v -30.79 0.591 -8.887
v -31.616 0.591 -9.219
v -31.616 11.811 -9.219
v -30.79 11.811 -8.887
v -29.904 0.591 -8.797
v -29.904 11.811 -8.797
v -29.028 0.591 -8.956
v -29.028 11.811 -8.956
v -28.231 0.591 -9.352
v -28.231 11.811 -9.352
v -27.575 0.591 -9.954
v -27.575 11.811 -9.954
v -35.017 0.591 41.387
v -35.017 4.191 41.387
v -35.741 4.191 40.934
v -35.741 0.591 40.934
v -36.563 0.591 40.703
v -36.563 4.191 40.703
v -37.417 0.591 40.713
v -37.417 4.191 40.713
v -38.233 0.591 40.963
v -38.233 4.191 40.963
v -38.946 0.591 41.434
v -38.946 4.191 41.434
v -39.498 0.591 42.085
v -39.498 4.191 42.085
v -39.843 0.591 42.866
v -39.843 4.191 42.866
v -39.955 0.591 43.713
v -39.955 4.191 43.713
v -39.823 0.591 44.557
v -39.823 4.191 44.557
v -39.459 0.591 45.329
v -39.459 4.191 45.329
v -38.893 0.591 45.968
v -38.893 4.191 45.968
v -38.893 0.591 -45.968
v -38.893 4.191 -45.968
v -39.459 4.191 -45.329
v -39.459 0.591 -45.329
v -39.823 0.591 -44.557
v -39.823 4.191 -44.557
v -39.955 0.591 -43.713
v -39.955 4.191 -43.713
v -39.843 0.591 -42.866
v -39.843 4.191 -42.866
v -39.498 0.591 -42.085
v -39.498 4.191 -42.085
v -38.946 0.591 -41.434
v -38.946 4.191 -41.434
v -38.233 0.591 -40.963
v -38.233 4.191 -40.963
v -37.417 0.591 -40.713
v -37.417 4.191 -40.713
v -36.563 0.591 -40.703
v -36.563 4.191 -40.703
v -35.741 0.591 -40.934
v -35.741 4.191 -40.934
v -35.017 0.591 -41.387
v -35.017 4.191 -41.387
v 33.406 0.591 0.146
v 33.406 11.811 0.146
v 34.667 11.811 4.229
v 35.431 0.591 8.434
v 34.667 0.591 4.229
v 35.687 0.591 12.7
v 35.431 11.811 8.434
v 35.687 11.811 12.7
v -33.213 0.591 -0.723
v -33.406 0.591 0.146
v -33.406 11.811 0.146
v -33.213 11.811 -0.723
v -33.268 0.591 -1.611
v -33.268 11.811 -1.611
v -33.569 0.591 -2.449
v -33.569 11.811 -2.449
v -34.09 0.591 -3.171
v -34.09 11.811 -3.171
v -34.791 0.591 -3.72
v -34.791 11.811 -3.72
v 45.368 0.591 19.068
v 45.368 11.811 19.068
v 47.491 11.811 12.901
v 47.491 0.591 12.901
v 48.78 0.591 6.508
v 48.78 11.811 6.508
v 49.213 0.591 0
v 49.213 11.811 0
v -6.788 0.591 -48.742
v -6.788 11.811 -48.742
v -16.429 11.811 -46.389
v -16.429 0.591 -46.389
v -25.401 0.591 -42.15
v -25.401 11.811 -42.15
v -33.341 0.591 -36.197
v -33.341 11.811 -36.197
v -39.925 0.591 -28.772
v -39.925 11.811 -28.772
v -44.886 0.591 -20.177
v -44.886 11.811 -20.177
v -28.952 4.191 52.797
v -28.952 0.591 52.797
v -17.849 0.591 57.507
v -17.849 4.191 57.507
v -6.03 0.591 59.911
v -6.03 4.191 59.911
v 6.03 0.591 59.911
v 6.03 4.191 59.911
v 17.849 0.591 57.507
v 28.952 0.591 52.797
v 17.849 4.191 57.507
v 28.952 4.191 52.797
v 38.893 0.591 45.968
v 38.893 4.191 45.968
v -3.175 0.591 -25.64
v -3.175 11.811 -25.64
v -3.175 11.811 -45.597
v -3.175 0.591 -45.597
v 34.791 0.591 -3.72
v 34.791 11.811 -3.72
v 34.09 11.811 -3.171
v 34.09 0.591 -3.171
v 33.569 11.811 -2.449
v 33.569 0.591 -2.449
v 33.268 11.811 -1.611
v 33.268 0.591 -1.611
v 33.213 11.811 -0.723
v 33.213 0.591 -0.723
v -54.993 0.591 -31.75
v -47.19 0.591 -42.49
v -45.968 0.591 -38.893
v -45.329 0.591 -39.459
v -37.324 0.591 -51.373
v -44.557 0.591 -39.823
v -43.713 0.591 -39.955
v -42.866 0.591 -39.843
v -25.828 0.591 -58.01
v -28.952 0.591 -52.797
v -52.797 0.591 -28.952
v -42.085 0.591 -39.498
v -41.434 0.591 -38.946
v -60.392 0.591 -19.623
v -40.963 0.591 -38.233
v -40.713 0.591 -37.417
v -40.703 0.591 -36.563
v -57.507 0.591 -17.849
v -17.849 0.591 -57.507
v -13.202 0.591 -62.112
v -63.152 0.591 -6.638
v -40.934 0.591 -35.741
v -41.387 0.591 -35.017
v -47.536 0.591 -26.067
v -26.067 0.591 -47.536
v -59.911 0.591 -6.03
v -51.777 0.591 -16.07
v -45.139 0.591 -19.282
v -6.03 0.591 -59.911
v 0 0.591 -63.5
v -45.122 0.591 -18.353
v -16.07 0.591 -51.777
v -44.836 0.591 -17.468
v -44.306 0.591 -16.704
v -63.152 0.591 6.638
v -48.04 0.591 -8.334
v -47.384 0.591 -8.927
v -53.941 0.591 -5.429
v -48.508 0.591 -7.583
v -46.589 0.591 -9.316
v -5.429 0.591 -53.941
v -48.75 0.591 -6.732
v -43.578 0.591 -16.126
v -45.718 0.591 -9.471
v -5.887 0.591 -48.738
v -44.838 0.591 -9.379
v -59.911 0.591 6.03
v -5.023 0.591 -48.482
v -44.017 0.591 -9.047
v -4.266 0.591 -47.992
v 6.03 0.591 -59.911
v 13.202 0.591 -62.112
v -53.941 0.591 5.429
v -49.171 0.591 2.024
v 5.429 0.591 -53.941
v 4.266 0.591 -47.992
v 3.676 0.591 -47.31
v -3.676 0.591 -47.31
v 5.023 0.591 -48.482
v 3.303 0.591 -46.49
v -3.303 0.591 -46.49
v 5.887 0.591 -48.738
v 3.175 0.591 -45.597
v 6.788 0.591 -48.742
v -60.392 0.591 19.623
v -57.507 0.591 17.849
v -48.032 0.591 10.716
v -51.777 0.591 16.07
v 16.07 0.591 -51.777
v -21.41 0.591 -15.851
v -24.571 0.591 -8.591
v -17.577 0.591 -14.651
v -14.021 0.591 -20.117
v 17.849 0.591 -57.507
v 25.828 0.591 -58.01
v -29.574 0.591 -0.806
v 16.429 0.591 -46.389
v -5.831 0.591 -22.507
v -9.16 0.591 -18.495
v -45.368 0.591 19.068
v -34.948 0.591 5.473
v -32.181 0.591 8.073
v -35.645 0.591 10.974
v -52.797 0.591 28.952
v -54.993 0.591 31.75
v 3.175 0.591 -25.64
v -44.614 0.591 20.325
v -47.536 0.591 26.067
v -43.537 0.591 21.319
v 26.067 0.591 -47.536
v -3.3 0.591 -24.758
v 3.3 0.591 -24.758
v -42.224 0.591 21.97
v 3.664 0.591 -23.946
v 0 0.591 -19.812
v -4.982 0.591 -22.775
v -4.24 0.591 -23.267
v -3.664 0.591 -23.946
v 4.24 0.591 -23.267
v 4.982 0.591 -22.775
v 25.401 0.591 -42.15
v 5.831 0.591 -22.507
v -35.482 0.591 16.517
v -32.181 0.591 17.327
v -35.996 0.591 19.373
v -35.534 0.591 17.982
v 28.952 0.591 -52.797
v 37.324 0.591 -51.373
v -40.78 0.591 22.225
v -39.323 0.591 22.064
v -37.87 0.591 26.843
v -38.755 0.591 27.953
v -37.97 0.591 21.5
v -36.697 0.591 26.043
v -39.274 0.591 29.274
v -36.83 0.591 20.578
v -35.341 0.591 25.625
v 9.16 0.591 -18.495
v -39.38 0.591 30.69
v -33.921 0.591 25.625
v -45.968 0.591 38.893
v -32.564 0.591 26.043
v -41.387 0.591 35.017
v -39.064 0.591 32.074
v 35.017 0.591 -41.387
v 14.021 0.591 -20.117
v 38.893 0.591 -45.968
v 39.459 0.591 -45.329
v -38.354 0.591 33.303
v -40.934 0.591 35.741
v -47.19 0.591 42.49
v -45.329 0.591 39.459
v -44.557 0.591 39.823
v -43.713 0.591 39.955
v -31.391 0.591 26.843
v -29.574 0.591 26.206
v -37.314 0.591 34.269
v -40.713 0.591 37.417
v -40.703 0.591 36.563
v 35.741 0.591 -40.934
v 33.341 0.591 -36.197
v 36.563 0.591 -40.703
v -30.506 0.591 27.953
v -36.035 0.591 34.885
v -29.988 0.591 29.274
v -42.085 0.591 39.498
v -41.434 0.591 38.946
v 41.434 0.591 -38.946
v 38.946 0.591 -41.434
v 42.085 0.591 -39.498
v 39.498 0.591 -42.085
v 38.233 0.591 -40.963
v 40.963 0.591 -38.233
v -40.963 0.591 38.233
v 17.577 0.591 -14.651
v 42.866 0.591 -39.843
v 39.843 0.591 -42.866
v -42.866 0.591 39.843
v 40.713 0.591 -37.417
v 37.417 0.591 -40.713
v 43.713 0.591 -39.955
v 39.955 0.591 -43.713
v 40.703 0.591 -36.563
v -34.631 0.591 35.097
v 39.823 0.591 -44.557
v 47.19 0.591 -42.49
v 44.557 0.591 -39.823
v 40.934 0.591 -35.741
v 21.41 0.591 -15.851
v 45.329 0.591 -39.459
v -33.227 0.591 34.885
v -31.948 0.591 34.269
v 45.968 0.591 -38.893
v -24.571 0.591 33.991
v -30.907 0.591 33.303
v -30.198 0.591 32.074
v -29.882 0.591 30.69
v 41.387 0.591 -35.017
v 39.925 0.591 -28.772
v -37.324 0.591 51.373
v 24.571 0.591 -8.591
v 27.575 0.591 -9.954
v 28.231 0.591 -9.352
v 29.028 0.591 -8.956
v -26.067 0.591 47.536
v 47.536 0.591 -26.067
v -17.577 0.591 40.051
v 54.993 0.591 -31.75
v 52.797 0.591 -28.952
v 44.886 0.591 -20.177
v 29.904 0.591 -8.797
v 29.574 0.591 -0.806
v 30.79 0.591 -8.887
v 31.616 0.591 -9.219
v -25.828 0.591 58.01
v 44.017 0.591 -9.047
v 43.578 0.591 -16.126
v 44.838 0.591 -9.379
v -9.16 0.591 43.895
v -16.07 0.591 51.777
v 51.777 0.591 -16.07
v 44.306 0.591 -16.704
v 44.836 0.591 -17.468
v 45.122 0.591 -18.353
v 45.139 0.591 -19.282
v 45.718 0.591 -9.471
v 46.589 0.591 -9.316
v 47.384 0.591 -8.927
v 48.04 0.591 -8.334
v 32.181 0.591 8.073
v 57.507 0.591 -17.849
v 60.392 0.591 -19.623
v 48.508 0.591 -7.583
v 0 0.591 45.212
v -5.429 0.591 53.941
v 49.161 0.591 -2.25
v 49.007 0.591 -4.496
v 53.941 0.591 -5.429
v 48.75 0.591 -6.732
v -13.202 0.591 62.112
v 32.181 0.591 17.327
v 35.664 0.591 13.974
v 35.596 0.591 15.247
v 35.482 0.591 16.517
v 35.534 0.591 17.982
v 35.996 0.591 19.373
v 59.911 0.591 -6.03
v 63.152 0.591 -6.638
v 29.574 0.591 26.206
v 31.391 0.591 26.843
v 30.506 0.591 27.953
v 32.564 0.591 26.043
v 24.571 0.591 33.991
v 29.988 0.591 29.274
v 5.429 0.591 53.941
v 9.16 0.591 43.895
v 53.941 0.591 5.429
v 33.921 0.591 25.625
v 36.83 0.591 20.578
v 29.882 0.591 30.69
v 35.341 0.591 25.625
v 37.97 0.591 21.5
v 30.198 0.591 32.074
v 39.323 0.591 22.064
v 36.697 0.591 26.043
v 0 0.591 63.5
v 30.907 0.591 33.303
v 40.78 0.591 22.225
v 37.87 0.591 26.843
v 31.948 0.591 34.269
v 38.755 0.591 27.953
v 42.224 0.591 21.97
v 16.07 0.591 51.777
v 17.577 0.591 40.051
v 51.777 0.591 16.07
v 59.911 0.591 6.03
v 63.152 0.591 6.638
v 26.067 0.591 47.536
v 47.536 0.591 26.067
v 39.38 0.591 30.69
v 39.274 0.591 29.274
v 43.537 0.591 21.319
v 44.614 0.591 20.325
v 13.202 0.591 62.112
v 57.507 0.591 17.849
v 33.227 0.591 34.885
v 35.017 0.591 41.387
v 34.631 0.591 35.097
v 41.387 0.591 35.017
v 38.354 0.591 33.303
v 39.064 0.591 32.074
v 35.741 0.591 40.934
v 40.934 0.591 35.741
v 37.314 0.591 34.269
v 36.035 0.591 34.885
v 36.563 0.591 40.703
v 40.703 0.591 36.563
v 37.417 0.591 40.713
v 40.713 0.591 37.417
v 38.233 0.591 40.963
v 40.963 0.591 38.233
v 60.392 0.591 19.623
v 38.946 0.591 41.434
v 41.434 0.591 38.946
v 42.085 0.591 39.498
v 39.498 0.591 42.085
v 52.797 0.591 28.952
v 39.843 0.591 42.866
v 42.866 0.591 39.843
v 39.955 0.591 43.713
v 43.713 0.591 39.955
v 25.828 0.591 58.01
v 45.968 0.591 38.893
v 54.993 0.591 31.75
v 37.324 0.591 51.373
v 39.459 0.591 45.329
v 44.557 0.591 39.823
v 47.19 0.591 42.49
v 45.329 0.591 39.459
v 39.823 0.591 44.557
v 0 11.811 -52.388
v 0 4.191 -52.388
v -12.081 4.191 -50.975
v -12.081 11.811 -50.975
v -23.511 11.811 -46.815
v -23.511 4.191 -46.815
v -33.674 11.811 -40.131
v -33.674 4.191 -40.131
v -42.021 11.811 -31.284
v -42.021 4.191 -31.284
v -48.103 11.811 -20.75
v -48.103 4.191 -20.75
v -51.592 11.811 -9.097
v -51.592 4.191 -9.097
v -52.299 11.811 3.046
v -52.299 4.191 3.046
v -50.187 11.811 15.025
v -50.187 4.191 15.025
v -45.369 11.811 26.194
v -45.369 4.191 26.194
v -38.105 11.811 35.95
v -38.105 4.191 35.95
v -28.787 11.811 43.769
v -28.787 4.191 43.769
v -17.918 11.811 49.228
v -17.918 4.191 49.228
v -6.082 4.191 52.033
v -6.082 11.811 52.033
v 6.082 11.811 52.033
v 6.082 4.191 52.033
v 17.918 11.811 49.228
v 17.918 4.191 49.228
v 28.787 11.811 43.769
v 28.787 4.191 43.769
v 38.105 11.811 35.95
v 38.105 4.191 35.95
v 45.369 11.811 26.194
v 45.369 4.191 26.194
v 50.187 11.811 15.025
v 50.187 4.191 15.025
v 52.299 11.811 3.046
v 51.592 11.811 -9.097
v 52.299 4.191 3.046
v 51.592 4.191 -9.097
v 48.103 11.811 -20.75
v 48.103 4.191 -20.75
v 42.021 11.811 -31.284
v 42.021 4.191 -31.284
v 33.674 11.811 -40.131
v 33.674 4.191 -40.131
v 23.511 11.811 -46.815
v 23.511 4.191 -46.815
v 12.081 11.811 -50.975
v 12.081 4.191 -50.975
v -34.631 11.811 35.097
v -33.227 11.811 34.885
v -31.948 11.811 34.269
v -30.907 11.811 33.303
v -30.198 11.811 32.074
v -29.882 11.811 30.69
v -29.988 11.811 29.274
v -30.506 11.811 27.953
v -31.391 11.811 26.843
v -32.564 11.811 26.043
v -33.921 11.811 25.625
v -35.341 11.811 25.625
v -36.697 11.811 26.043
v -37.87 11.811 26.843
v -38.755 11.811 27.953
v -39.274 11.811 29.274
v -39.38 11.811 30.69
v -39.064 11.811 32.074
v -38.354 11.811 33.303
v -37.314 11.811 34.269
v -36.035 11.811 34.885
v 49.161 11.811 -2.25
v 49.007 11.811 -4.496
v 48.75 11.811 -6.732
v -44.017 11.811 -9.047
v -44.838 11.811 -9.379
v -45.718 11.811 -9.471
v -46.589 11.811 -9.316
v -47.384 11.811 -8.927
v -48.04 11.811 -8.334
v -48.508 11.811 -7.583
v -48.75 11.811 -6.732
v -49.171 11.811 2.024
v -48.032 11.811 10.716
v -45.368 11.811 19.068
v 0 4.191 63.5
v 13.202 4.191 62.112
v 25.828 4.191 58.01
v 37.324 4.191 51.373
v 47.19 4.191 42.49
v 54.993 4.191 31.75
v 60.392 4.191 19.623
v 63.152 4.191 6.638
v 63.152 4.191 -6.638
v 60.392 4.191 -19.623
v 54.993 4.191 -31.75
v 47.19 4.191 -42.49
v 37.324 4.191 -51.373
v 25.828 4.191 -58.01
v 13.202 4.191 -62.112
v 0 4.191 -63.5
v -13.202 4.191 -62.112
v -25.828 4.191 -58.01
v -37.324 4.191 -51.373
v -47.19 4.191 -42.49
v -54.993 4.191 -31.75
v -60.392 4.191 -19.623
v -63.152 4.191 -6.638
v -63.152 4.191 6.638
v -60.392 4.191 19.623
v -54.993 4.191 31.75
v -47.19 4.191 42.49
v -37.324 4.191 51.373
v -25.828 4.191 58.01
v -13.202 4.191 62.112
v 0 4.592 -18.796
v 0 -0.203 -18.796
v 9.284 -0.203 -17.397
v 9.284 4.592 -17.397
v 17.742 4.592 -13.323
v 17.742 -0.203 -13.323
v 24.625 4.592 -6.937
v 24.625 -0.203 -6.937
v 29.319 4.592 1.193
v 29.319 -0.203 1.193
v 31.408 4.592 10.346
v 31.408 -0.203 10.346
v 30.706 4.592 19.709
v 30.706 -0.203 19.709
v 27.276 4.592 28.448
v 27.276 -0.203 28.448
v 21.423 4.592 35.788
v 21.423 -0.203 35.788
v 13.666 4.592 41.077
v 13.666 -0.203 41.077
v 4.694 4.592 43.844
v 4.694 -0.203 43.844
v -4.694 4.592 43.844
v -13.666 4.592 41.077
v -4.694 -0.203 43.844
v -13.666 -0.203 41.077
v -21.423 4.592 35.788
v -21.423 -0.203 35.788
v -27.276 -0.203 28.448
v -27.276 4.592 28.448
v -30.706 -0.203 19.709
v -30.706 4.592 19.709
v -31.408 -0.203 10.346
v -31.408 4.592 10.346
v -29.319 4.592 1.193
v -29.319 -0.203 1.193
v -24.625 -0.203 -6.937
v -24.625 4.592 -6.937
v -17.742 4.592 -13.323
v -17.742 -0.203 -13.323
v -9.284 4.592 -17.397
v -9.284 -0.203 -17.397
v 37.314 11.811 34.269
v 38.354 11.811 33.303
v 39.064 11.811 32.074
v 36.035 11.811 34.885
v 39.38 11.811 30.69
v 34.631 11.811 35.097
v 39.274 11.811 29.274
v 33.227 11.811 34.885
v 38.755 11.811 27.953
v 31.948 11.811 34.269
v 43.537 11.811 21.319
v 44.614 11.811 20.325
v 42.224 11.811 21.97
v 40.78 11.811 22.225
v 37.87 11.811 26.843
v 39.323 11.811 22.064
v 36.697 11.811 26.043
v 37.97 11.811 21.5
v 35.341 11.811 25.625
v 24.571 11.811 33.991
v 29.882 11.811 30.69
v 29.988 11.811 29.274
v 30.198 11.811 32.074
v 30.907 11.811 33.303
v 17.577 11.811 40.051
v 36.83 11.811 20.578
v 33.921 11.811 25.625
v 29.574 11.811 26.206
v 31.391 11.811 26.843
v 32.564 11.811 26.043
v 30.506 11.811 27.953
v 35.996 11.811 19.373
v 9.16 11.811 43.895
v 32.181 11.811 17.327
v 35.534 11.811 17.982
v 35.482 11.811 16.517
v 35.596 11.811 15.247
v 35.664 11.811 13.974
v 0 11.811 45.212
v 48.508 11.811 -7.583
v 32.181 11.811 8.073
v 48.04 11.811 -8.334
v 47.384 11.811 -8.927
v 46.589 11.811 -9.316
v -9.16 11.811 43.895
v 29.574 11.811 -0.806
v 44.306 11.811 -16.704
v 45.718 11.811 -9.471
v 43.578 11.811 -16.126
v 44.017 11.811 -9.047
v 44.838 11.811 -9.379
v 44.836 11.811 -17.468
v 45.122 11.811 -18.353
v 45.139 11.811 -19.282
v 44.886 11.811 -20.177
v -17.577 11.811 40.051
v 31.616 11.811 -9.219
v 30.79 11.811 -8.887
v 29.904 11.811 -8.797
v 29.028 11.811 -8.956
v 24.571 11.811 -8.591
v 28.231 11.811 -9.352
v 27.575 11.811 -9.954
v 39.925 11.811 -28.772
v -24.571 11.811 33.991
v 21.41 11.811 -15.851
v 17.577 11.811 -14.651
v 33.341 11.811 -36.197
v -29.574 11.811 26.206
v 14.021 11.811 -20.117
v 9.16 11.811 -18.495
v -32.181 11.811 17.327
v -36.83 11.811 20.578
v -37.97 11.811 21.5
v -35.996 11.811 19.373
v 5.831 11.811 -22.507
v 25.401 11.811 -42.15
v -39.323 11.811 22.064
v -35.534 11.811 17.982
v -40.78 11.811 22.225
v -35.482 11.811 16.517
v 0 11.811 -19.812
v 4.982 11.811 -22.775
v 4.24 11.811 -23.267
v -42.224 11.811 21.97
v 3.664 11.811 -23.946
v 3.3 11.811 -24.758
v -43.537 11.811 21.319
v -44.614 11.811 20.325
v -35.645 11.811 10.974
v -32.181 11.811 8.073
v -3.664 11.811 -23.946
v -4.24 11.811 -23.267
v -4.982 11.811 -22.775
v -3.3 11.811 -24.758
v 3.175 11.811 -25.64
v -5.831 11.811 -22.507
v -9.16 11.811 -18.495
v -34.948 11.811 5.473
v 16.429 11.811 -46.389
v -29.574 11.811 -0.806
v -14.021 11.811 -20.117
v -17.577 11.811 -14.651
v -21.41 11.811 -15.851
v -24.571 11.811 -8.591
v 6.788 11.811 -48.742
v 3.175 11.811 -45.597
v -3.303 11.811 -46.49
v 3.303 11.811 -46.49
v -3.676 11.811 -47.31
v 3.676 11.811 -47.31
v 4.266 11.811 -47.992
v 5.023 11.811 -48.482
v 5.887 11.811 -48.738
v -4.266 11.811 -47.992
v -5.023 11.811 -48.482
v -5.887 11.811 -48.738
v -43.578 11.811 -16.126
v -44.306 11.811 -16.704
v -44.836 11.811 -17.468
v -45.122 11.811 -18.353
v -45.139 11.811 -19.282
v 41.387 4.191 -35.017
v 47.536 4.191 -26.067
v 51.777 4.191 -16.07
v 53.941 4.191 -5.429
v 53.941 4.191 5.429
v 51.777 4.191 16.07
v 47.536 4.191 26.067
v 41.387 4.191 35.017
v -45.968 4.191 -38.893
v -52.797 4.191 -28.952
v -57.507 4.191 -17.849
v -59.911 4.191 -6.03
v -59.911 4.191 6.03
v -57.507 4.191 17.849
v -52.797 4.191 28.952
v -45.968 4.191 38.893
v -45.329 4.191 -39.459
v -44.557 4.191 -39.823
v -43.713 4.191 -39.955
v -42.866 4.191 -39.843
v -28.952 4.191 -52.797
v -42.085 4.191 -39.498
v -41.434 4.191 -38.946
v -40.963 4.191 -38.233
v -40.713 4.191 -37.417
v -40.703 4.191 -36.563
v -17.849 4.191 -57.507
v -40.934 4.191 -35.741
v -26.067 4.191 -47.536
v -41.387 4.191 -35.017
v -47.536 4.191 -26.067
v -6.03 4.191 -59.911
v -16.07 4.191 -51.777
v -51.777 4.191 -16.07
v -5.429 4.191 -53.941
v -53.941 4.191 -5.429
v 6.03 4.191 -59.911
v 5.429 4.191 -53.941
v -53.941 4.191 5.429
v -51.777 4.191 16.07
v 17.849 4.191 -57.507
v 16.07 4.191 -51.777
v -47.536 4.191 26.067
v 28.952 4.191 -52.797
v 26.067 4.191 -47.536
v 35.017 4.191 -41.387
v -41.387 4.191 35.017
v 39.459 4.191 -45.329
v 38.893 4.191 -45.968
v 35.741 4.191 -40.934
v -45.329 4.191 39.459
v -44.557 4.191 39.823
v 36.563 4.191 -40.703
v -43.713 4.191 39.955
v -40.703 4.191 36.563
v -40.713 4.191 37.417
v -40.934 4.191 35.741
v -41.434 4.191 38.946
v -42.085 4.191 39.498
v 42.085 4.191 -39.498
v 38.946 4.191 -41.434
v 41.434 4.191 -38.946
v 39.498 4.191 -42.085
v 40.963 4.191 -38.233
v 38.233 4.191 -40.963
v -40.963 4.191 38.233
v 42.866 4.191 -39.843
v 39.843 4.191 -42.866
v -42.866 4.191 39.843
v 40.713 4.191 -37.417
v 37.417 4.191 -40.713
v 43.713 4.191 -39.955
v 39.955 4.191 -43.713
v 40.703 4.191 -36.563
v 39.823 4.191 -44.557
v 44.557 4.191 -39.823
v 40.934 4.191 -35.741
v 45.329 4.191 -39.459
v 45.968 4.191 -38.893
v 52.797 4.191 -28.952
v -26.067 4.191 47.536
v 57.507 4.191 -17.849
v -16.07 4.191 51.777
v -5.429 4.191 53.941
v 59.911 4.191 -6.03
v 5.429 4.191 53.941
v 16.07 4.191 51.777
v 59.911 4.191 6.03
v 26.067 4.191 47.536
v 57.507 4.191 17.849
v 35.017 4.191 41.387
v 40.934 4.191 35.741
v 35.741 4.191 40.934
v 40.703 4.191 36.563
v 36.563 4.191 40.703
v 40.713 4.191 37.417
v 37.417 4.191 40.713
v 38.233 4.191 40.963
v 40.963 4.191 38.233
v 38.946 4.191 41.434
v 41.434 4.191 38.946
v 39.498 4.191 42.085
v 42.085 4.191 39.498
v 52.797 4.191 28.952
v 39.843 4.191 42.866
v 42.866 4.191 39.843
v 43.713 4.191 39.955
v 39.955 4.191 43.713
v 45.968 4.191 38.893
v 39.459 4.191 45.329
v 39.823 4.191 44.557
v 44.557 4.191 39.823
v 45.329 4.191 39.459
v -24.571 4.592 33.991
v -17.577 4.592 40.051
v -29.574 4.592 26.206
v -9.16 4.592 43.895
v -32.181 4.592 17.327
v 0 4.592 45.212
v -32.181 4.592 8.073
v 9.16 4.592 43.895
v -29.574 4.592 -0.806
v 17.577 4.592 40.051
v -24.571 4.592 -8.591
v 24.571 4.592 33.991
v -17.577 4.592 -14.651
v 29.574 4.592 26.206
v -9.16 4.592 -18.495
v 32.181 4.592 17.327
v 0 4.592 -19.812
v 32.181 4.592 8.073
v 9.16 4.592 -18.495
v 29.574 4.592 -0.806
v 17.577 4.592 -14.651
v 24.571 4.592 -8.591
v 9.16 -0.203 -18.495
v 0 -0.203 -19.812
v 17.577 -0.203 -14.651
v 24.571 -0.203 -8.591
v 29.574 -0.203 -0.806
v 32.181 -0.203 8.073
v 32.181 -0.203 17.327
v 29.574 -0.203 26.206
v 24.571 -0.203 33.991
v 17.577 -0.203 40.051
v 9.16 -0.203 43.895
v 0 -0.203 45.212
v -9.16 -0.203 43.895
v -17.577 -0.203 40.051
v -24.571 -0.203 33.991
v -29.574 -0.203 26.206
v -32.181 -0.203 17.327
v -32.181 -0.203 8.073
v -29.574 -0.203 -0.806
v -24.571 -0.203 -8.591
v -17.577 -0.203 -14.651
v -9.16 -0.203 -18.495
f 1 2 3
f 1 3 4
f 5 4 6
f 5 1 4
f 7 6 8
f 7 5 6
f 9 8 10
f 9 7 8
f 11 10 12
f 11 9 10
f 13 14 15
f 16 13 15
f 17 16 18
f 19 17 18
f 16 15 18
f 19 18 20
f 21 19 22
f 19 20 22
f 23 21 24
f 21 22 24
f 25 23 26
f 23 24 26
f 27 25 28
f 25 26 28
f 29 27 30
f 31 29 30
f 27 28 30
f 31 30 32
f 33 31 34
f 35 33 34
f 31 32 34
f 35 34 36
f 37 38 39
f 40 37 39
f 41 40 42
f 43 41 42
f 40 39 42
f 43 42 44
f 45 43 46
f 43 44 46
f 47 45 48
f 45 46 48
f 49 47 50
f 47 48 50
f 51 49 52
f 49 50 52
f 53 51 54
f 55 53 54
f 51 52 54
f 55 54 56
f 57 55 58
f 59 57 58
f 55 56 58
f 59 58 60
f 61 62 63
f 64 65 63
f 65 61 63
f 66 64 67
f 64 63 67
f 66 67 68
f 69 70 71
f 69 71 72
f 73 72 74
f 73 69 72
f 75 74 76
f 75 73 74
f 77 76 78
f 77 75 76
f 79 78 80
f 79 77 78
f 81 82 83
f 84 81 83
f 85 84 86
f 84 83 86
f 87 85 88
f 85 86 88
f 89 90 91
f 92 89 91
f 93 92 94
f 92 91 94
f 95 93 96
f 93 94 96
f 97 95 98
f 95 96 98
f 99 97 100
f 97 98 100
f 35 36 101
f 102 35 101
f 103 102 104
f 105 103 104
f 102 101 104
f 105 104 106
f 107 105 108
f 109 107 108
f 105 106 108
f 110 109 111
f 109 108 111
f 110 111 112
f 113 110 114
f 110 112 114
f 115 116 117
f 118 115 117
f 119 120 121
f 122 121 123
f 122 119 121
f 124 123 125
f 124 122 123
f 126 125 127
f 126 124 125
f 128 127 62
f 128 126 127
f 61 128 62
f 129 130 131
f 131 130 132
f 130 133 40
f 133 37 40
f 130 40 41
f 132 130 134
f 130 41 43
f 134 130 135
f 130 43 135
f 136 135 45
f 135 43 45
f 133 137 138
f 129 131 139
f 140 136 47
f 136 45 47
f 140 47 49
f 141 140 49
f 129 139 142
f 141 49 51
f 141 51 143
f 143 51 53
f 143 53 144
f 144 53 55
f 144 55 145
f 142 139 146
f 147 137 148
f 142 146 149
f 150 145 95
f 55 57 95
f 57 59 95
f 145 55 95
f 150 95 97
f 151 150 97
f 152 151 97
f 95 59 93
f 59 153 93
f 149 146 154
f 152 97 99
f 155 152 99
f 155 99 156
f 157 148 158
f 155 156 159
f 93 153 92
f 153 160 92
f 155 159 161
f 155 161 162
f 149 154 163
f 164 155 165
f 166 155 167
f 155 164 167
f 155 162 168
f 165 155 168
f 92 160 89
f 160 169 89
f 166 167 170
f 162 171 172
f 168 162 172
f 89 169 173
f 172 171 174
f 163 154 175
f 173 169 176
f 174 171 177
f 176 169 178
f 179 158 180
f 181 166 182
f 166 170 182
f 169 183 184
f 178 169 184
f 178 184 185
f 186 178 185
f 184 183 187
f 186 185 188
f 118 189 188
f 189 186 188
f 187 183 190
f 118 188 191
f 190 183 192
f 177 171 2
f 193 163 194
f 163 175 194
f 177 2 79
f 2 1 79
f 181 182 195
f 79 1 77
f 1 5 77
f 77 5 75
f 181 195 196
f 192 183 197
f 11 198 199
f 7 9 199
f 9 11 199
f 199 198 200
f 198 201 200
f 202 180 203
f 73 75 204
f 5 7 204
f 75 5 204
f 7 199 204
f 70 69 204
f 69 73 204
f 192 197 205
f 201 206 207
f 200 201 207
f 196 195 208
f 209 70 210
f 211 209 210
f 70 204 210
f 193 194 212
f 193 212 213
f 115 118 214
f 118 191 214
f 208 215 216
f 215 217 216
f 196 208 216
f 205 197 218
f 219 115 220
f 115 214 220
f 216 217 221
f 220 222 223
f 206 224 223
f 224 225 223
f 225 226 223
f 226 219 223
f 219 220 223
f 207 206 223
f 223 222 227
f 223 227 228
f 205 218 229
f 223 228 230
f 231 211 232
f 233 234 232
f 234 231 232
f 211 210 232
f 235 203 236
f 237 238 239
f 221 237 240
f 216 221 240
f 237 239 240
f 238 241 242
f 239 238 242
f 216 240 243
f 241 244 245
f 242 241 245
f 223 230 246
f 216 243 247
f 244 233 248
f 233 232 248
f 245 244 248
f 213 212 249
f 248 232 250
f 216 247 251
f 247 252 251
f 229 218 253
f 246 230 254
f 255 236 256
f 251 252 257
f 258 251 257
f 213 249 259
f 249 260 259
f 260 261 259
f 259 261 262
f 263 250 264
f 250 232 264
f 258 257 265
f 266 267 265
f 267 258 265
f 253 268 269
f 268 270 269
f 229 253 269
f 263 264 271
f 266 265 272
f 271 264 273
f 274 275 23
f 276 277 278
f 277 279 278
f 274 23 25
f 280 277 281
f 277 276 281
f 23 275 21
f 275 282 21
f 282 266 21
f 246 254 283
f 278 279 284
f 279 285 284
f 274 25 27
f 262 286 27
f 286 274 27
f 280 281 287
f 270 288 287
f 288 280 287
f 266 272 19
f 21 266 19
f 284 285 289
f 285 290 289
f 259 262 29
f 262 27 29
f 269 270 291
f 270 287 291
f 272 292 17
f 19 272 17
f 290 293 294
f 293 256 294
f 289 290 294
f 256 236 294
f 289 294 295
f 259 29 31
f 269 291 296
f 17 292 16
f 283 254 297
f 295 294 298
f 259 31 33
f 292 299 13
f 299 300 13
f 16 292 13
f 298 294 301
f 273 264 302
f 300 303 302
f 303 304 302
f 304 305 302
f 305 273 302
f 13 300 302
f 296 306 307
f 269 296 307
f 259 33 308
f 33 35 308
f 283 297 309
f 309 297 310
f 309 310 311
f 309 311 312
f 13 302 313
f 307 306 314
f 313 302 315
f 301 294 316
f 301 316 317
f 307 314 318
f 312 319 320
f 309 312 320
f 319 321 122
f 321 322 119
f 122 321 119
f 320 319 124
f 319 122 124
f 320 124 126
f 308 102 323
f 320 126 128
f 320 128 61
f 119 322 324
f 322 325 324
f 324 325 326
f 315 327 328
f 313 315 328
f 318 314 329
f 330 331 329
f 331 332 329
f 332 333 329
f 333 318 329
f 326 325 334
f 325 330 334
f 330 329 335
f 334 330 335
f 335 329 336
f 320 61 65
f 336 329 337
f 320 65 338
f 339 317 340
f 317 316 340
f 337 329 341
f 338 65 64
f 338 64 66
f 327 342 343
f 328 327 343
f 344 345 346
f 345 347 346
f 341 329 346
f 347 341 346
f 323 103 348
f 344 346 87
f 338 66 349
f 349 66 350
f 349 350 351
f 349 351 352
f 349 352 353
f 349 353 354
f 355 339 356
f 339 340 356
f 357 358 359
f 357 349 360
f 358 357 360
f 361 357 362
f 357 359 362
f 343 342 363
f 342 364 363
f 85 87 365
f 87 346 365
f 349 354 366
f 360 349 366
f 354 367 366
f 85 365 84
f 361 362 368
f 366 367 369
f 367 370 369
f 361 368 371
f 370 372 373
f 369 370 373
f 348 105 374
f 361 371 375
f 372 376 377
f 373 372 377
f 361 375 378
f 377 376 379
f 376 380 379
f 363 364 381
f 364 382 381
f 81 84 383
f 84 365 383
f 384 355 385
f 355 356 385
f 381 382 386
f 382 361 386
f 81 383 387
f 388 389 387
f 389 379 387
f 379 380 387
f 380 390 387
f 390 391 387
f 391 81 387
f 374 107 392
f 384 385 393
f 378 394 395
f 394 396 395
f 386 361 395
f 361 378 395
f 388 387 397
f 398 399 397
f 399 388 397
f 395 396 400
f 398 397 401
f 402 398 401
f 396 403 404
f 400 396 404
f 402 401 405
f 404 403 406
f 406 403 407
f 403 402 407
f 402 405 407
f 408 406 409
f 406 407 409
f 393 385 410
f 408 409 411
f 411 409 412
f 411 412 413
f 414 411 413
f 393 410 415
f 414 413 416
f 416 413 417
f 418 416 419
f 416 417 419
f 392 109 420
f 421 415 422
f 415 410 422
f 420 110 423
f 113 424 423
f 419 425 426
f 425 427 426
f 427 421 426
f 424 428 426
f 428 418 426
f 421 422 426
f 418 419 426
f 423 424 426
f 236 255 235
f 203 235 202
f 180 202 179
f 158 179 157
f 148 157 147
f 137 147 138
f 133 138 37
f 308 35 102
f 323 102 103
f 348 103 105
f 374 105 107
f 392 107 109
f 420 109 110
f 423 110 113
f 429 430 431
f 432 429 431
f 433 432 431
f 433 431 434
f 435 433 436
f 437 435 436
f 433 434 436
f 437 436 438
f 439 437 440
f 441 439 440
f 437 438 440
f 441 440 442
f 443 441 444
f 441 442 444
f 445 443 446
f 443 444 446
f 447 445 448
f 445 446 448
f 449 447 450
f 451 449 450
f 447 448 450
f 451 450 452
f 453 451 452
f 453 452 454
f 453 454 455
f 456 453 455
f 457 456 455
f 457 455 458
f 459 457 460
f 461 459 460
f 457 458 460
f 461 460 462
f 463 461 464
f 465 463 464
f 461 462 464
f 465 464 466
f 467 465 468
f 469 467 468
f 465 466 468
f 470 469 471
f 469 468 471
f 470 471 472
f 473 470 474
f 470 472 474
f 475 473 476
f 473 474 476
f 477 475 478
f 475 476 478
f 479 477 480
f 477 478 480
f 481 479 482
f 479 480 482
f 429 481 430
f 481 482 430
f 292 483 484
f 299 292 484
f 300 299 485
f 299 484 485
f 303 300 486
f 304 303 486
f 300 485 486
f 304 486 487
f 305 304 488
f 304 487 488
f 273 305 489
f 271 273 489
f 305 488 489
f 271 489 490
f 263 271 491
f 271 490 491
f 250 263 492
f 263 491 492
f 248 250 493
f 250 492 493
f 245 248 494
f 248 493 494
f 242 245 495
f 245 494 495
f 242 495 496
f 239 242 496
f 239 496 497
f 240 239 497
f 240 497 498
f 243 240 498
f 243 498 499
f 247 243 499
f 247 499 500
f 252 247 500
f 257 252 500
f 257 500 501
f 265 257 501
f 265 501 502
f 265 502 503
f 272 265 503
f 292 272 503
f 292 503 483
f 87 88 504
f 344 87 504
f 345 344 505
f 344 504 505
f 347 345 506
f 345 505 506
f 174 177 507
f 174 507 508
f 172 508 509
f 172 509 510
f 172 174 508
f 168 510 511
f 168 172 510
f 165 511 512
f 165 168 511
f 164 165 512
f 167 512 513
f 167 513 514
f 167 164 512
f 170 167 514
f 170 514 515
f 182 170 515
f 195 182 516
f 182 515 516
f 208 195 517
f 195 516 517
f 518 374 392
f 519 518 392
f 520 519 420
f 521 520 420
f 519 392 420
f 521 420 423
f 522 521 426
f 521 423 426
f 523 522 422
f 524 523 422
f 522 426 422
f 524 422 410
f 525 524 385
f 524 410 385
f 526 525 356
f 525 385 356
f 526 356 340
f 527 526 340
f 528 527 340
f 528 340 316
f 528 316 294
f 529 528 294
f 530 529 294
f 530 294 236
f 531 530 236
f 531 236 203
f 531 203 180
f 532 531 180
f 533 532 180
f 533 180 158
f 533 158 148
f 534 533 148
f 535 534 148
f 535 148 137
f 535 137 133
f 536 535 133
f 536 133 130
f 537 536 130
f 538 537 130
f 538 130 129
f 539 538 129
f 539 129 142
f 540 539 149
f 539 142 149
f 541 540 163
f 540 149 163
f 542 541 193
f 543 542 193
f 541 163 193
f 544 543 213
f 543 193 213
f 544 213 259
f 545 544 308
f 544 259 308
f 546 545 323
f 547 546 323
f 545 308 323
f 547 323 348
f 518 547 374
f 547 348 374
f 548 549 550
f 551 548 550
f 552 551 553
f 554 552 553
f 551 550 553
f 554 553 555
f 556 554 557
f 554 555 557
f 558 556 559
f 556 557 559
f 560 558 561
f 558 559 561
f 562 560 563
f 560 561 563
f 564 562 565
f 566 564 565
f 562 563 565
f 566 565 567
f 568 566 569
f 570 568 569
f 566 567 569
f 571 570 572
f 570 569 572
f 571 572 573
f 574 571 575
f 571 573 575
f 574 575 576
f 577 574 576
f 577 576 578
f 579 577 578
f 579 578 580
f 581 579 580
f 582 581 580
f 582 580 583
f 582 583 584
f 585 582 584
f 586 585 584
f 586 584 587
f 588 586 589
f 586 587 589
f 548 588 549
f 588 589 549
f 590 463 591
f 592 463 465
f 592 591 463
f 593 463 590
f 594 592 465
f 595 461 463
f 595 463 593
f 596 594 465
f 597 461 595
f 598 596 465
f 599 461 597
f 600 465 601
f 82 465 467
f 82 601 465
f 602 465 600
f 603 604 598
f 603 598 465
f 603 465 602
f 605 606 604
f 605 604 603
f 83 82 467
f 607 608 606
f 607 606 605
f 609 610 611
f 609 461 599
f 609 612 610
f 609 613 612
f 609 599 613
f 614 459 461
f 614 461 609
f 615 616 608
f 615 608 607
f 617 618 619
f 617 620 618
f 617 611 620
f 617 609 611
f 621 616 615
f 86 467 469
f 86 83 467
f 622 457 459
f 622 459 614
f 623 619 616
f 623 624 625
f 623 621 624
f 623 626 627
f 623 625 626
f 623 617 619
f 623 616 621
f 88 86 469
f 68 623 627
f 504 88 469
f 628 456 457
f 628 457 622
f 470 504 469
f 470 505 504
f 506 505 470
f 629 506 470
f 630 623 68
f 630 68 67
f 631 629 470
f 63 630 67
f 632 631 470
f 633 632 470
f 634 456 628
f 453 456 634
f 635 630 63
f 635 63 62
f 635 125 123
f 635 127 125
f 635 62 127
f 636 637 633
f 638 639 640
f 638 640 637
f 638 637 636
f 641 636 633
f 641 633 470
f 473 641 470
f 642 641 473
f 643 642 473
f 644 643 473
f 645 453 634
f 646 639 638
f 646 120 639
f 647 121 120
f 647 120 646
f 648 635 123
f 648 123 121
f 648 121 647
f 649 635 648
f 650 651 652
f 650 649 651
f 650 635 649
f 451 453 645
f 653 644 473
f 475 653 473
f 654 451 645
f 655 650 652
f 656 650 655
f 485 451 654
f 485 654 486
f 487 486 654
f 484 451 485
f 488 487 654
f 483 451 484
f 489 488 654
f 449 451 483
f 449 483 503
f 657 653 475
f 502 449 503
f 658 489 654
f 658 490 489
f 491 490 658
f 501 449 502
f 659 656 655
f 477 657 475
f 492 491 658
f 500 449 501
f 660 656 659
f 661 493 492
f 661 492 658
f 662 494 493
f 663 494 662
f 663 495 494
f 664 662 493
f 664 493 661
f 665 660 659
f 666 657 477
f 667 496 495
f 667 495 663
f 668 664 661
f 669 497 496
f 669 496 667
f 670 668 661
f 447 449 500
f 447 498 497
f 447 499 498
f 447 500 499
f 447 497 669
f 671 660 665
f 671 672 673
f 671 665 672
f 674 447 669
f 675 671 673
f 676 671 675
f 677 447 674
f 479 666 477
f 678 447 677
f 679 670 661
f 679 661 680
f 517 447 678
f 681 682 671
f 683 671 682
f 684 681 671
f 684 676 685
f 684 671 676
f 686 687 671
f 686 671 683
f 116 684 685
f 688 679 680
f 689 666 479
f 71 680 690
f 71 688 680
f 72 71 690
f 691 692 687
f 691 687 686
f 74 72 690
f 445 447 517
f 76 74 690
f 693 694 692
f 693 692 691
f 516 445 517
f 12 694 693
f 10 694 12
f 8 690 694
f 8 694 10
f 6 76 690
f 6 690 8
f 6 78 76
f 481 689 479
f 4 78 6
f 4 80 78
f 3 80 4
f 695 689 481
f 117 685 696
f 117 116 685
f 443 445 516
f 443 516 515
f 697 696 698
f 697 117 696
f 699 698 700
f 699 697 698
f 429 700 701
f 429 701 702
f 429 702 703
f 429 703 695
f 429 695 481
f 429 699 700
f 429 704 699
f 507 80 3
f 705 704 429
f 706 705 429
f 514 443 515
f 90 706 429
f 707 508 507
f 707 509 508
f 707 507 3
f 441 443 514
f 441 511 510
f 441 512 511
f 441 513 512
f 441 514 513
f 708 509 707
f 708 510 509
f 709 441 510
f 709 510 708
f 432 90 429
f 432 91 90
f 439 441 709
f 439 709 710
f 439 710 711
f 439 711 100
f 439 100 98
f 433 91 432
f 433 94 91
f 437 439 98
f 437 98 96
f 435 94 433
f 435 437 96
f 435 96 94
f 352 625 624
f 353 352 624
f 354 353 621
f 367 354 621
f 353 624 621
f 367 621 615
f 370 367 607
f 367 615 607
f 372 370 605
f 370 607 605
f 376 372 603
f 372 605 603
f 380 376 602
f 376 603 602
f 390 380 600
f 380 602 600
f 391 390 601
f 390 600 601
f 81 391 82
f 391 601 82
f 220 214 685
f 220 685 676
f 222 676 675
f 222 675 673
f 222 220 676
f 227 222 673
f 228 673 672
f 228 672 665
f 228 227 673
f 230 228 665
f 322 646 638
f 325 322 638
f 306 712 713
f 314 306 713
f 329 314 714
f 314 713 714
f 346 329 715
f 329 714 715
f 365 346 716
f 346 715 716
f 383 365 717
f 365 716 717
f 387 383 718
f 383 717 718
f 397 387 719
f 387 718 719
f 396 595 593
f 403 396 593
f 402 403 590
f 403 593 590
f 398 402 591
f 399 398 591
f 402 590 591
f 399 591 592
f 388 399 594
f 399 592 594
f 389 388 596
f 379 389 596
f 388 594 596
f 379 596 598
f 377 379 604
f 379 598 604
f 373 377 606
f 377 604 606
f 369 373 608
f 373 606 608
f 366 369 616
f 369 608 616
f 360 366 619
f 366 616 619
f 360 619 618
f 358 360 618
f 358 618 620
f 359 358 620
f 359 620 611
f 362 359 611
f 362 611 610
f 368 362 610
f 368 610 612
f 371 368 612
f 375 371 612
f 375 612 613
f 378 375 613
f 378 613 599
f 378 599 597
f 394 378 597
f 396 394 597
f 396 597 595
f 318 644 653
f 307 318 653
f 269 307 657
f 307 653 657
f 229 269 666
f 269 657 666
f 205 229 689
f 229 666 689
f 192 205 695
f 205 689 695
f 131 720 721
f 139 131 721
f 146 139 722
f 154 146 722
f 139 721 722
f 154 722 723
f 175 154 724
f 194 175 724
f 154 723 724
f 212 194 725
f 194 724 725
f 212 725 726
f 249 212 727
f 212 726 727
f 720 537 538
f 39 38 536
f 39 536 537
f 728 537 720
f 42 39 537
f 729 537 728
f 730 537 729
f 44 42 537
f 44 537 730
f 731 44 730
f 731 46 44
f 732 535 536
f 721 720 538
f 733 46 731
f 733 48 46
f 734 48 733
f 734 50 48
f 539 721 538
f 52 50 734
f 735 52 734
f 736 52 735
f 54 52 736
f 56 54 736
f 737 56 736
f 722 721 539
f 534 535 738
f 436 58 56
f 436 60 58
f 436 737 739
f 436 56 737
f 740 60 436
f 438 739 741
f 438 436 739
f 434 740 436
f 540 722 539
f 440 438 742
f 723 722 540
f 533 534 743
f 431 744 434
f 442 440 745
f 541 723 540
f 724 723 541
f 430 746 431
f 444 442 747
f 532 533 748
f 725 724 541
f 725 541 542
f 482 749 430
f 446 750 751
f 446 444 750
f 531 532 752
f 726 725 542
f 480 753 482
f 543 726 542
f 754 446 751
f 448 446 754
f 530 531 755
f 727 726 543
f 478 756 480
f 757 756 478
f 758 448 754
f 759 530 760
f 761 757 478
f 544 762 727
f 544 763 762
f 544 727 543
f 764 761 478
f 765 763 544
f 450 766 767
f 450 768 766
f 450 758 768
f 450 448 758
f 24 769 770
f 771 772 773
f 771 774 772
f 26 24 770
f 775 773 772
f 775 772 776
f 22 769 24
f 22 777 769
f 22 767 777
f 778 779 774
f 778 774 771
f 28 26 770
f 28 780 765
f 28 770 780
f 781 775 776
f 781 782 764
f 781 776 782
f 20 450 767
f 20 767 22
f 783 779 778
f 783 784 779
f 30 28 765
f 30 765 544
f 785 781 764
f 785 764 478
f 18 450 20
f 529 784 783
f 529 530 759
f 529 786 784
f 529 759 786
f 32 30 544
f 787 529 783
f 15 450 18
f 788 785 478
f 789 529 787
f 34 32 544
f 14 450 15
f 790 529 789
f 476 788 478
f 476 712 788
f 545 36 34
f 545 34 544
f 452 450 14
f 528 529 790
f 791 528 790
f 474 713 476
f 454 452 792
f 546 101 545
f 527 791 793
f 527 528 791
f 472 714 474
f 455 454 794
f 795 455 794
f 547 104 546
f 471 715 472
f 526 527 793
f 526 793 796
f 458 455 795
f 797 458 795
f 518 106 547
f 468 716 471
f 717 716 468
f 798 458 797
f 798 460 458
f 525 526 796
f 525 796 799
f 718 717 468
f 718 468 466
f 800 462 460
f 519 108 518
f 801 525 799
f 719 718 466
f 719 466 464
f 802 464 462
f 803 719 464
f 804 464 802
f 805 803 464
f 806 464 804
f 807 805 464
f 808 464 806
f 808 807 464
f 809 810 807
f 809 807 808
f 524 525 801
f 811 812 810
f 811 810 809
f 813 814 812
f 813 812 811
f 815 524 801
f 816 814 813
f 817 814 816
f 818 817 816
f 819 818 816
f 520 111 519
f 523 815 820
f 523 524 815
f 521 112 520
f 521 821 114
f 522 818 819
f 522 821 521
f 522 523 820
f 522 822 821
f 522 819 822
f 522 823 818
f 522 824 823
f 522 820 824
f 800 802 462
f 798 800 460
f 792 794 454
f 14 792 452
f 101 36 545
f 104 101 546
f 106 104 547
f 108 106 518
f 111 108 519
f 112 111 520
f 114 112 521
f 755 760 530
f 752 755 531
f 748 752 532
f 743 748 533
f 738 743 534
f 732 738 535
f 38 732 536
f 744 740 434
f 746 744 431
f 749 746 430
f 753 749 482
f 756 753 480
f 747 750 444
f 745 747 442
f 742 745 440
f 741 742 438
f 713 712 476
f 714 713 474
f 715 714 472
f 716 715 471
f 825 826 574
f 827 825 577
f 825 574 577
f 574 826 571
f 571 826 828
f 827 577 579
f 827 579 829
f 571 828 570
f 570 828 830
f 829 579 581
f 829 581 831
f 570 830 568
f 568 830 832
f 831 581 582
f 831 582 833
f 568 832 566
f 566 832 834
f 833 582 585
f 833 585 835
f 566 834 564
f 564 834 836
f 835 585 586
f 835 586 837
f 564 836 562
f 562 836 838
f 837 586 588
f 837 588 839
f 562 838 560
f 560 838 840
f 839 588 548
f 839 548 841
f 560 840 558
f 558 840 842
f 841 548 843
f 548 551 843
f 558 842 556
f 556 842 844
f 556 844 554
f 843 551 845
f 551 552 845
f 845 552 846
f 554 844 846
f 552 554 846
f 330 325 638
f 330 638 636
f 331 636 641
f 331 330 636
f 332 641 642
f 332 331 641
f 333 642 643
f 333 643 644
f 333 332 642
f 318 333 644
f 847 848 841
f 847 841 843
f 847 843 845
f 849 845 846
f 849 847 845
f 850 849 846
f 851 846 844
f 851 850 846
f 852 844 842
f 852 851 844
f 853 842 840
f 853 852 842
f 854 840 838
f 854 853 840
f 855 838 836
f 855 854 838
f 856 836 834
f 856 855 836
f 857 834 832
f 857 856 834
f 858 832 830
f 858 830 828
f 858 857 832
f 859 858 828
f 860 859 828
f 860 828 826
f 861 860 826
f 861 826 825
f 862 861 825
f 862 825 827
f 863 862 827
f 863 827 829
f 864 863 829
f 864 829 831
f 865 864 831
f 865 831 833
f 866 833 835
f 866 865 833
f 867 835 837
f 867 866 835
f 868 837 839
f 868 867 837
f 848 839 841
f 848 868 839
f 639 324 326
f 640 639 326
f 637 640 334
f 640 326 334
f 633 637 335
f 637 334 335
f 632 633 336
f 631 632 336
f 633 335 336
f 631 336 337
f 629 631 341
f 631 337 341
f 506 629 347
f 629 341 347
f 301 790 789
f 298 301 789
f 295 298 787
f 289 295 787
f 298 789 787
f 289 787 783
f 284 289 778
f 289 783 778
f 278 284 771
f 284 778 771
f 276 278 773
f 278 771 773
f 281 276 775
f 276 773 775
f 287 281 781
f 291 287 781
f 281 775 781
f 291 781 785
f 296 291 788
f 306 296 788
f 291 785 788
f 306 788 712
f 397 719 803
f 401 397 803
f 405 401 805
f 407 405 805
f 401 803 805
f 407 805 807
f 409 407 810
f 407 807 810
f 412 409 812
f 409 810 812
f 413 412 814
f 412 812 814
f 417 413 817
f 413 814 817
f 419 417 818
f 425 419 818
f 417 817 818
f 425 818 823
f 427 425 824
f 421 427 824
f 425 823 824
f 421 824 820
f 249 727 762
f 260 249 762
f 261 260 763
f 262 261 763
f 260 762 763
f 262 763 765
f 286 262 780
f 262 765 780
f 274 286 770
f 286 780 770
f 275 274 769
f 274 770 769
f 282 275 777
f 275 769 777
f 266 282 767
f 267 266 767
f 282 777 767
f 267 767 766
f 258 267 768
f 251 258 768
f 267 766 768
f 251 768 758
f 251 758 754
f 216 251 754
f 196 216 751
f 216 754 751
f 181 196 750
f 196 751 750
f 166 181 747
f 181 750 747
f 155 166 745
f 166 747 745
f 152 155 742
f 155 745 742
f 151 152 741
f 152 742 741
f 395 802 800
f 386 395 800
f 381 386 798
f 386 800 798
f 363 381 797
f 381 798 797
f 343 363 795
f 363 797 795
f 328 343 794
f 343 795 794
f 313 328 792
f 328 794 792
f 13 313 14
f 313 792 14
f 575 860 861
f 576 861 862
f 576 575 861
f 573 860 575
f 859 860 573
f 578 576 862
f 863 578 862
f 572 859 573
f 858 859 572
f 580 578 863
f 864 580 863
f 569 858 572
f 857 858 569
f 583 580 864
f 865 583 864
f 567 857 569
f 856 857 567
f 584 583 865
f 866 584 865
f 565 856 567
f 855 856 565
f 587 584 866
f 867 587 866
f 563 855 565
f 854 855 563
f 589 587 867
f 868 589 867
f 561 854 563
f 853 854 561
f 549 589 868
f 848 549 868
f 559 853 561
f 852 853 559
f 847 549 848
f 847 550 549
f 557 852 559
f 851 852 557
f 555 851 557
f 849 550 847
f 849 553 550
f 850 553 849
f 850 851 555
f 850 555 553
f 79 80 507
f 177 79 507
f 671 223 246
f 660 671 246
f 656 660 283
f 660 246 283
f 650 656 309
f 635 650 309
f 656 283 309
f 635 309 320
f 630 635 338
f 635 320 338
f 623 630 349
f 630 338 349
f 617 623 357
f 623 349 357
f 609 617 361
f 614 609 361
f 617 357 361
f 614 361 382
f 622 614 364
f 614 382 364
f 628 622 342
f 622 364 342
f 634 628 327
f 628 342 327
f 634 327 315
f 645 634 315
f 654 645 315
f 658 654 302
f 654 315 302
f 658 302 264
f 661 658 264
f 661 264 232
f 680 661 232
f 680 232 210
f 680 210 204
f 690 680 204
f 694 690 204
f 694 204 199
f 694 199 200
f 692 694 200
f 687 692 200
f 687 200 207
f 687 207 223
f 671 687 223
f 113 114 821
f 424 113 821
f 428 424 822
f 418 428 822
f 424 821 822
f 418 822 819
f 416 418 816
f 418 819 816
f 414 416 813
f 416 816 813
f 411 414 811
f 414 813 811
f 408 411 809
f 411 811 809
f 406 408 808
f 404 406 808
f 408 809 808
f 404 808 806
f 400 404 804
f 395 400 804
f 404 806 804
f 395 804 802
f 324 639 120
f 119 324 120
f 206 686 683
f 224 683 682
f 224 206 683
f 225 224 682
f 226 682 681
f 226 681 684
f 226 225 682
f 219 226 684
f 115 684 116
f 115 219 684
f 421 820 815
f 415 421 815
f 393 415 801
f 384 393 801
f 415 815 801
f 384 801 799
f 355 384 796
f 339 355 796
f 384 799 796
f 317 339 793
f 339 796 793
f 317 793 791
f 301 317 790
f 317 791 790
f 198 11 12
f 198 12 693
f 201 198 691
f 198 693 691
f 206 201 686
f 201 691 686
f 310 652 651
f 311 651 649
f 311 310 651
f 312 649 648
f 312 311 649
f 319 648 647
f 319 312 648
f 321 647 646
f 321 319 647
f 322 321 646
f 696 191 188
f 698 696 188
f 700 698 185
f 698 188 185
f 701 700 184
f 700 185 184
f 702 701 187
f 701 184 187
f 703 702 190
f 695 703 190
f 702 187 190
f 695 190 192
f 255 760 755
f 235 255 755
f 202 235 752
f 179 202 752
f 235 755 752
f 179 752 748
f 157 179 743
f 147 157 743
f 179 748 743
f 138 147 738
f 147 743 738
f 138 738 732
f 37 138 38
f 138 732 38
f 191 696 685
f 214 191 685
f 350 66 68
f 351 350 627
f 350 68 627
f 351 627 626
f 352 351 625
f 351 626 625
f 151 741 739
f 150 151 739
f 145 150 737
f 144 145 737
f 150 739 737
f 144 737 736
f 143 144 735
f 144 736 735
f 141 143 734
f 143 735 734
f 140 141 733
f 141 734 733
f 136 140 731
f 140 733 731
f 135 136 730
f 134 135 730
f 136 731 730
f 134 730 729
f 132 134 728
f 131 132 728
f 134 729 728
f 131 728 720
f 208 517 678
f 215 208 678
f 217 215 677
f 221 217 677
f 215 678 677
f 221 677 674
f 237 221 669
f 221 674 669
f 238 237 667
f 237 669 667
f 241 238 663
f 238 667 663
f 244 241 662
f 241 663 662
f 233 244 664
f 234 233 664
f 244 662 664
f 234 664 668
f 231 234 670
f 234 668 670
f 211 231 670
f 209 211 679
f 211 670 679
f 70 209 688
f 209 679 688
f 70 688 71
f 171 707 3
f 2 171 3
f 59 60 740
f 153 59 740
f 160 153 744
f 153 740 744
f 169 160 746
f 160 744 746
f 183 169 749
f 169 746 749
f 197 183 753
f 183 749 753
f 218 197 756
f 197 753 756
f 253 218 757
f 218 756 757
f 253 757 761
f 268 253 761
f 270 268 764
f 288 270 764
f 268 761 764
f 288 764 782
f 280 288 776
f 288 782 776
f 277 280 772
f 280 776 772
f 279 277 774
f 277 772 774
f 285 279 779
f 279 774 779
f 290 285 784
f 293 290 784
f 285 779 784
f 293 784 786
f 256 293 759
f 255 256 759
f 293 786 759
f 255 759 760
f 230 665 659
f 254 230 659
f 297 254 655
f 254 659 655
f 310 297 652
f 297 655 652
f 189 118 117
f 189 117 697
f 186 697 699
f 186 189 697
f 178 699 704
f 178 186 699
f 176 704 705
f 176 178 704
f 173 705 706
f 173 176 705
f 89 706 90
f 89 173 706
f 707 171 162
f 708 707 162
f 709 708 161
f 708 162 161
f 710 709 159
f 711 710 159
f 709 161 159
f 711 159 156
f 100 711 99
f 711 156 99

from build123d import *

# Parameters (mm, degrees)
SLOTTED_BODY_EXTRUDE_DEPTH      = 4.191
SLOTTED_BODY_EXTRUDE_DEPTH_BACK = 0.2032
SKETCH1_R                       = 61.9125
SKETCH1_R_2                     = 30.988
SKETCH5_R                       = 52.3875
BOSS_EXTRUDE3_DEPTH             = 7.62
SKETCH6_R                       = 32.512
CUT_EXTRUDE5_DEPTH              = 89.377917571
SKETCH8_R                       = 32.512
SKETCH8_R_2                     = 31.496
BOSS_EXTRUDE4_DEPTH             = 4.795000062
CUT_EXTRUDE7_DEPTH              = 36.068
FILLET1_R                       = 3.175
CUT_EXTRUDE8_DEPTH              = 36.068
MOVE_FACE1_BY                   = 1.5875
MOVE_FACE2_BY                   = 0.79375
SKETCH13_5_R                    = 3.175
CUT_EXTRUDE9_DEPTH              = 91.602654496
MOVE_FACE3_BY                   = 1.5875
MOVE_FACE3_2_BY                 = 1.5875


with BuildPart() as part:
    # Sketch1 → Slotted-Body Extrude (new, two sides: drawn at the far end of the back side and taken through both)
    with BuildSketch(Plane(origin=(0, 0, 0), x_dir=(1, 0, 0), z_dir=(0, 1, 0)).offset(-SLOTTED_BODY_EXTRUDE_DEPTH_BACK)):
        Circle(SKETCH1_R)
        with Locations((0, -12.7)):
            Circle(SKETCH1_R_2, mode=Mode.SUBTRACT)
    extrude(amount=SLOTTED_BODY_EXTRUDE_DEPTH + SLOTTED_BODY_EXTRUDE_DEPTH_BACK)

    # Sketch5 → Boss-Extrude3 (add)
    with BuildSketch(Plane(origin=(0, 4.191, 0), x_dir=(1, 0, 0), z_dir=(0, 1, 0))):
        Circle(SKETCH5_R)
    extrude(amount=BOSS_EXTRUDE3_DEPTH)

    # Sketch6 → Cut-Extrude5 (cut, through all)
    with BuildSketch(Plane.XZ.offset(0.2032)):
        with Locations((0, 12.7)):
            Circle(SKETCH6_R)
    extrude(amount=-CUT_EXTRUDE5_DEPTH, mode=Mode.SUBTRACT)

    # Sketch13 → Cut-Extrude7 (cut)
    with BuildSketch(Plane(origin=(0, 11.811, 0), x_dir=(1, 0, 0), z_dir=(0, 1, 0))):
        with BuildLine():
            Line((-45.989035316, 17.517956129), (-29.195791052, 7.822372033))
            ThreePointArc((-29.195791052, 7.822372033), (-17.8435, 18.205848585), (-3.175, 22.845482751))
            Line((-3.175, 22.845482751), (-3.175, 49.109973847))
            ThreePointArc((-3.175, 49.109973847), (-29.219676385, 39.598998324), (-45.989035316, 17.517956129))
        make_face()
        with BuildLine():
            ThreePointArc((-35.482309697, -16.516761399), (-35.210027203, -6.884851392), (-32.370791052, 2.323110718))
            Line((-32.370791052, 2.323110718), (-47.900191204, 11.289014077))
            ThreePointArc((-47.900191204, 11.289014077), (-49.04223906, -4.09010321), (-45.36846312, -19.06758271))
            ThreePointArc((-45.36846312, -19.06758271), (-39.32308801, -22.064321984), (-35.482309697, -16.516761399))
        make_face()
        with BuildLine():
            Line((3.175, 49.109973847), (3.175, 22.845482751))
            ThreePointArc((3.175, 22.845482751), (17.8435, 18.205848585), (29.195791052, 7.822372033))
            Line((29.195791052, 7.822372033), (45.989035316, 17.517956129))
            ThreePointArc((45.989035316, 17.517956129), (29.219676385, 39.598998324), (3.175, 49.109973847))
        make_face()
        with BuildLine():
            Line((47.900191204, 11.289014077), (32.370791052, 2.323110718))
            ThreePointArc((32.370791052, 2.323110718), (35.210027203, -6.884851392), (35.482309697, -16.516761399))
            ThreePointArc((35.482309697, -16.516761399), (39.32308801, -22.064321984), (45.36846312, -19.06758271))
            ThreePointArc((45.36846312, -19.06758271), (49.04223906, -4.09010321), (47.900191204, 11.289014077))
        make_face()
    extrude(amount=-CUT_EXTRUDE7_DEPTH, mode=Mode.SUBTRACT)

    # Fillet1
    fillet1_edges = [part.edges().sort_by_distance(p)[0] for p in [
        (47.900191204, 5.8039, -11.289014077),
        (32.370791052, 5.8039, -2.323110718),
        (29.195791052, 5.8039, -7.822372033),
        (45.989035316, 5.8039, -17.517956129),
        (3.175, 5.8039, -49.109973847),
        (3.175, 5.8039, -22.845482751),
        (-3.175, 5.8039, -22.845482751),
        (-3.175, 5.8039, -49.109973847),
        (-45.989035316, 5.8039, -17.517956129),
        (-29.195791052, 5.8039, -7.822372033),
        (-32.370791052, 5.8039, -2.323110718),
        (-47.900191204, 5.8039, -11.289014077),
    ]]
    fillet(fillet1_edges, radius=FILLET1_R)

    # Sketch12 → Cut-Extrude8 (cut)
    with BuildSketch(Plane(origin=(0, 4.191, 0), x_dir=(1, 0, 0), z_dir=(0, 1, 0))):
        with BuildLine():
            ThreePointArc((35.017146315, 41.387232889), (39.245117901, 41.739732907), (38.892617883, 45.967704494))
            ThreePointArc((38.892617883, 45.967704494), (0, 60.2135), (-38.892617883, 45.967704494))
            ThreePointArc((-38.892617883, 45.967704494), (-39.245117901, 41.739732907), (-35.017146315, 41.387232889))
            ThreePointArc((-35.017146315, 41.387232889), (-18.646136758, 50.906042532), (0, 54.2135))
            ThreePointArc((0, 54.2135), (18.646136758, 50.906042532), (35.017146315, 41.387232889))
        make_face()
        with BuildLine():
            ThreePointArc((-41.387232889, 35.017146315), (-41.739732907, 39.245117901), (-45.967704494, 38.892617883))
            ThreePointArc((-45.967704494, 38.892617883), (-60.2135, 0), (-45.967704494, -38.892617883))
            ThreePointArc((-45.967704494, -38.892617883), (-41.739732907, -39.245117901), (-41.387232889, -35.017146315))
            ThreePointArc((-41.387232889, -35.017146315), (-54.2135, 0), (-41.387232889, 35.017146315))
        make_face()
        with BuildLine():
            ThreePointArc((41.387232889, -35.017146315), (41.739732907, -39.245117901), (45.967704494, -38.892617883))
            ThreePointArc((45.967704494, -38.892617883), (60.2135, 0), (45.967704494, 38.892617883))
            ThreePointArc((45.967704494, 38.892617883), (41.739732907, 39.245117901), (41.387232889, 35.017146315))
            ThreePointArc((41.387232889, 35.017146315), (54.2135, 0), (41.387232889, -35.017146315))
        make_face()
        with BuildLine():
            ThreePointArc((-35.017146315, -41.387232889), (-39.245117901, -41.739732907), (-38.892617883, -45.967704494))
            ThreePointArc((-38.892617883, -45.967704494), (0, -60.2135), (38.892617883, -45.967704494))
            ThreePointArc((38.892617883, -45.967704494), (39.245117901, -41.739732907), (35.017146315, -41.387232889))
            ThreePointArc((35.017146315, -41.387232889), (0, -54.2135), (-35.017146315, -41.387232889))
        make_face()
    extrude(amount=-CUT_EXTRUDE8_DEPTH, mode=Mode.SUBTRACT)

    # Move Face1: a curved face moved outward by 1.5875
    add(Solid.thicken(part.faces().sort_by_distance((-61.9125, 1.9939, 0))[0], MOVE_FACE1_BY))

    # Move Face2: a face moved inward by 0.79375
    extrude(part.faces().sort_by_distance((0, -0.2032, -31.75))[0], amount=MOVE_FACE2_BY, dir=(0, 1, 0), mode=Mode.SUBTRACT)

    # Sketch13<5> → Cut-Extrude9 (cut, through all)
    with BuildSketch(Plane(origin=(0, 11.811, 0), x_dir=(1, 0, 0), z_dir=(0, 1, 0))):
        with Locations((-34.630813629, -30.33410875)):
            Circle(SKETCH13_5_R)
        with Locations((34.630813629, -30.33410875)):
            Circle(SKETCH13_5_R)
    extrude(amount=-CUT_EXTRUDE9_DEPTH, mode=Mode.SUBTRACT)

    # Move Face3: a curved face moved inward by 1.5875
    add(Solid.thicken(part.faces().sort_by_distance((31.455813629, 6.200775, 30.33410875))[0], -MOVE_FACE3_BY), mode=Mode.SUBTRACT)

    # Move Face3 2: a curved face moved inward by 1.5875
    add(Solid.thicken(part.faces().sort_by_distance((-37.805813629, 6.200775, 30.33410875))[0], -MOVE_FACE3_2_BY), mode=Mode.SUBTRACT)


with BuildPart() as body_2:
    # Sketch8 → Boss-Extrude4 (new body)
    with BuildSketch(Plane.XZ.offset(0.2032)):
        with Locations((0, 12.7)):
            Circle(SKETCH8_R)
        with Locations((0, 12.7)):
            Circle(SKETCH8_R_2, mode=Mode.SUBTRACT)
    extrude(amount=-BOSS_EXTRUDE4_DEPTH)


solid = Compound([part.part, body_2.part])
